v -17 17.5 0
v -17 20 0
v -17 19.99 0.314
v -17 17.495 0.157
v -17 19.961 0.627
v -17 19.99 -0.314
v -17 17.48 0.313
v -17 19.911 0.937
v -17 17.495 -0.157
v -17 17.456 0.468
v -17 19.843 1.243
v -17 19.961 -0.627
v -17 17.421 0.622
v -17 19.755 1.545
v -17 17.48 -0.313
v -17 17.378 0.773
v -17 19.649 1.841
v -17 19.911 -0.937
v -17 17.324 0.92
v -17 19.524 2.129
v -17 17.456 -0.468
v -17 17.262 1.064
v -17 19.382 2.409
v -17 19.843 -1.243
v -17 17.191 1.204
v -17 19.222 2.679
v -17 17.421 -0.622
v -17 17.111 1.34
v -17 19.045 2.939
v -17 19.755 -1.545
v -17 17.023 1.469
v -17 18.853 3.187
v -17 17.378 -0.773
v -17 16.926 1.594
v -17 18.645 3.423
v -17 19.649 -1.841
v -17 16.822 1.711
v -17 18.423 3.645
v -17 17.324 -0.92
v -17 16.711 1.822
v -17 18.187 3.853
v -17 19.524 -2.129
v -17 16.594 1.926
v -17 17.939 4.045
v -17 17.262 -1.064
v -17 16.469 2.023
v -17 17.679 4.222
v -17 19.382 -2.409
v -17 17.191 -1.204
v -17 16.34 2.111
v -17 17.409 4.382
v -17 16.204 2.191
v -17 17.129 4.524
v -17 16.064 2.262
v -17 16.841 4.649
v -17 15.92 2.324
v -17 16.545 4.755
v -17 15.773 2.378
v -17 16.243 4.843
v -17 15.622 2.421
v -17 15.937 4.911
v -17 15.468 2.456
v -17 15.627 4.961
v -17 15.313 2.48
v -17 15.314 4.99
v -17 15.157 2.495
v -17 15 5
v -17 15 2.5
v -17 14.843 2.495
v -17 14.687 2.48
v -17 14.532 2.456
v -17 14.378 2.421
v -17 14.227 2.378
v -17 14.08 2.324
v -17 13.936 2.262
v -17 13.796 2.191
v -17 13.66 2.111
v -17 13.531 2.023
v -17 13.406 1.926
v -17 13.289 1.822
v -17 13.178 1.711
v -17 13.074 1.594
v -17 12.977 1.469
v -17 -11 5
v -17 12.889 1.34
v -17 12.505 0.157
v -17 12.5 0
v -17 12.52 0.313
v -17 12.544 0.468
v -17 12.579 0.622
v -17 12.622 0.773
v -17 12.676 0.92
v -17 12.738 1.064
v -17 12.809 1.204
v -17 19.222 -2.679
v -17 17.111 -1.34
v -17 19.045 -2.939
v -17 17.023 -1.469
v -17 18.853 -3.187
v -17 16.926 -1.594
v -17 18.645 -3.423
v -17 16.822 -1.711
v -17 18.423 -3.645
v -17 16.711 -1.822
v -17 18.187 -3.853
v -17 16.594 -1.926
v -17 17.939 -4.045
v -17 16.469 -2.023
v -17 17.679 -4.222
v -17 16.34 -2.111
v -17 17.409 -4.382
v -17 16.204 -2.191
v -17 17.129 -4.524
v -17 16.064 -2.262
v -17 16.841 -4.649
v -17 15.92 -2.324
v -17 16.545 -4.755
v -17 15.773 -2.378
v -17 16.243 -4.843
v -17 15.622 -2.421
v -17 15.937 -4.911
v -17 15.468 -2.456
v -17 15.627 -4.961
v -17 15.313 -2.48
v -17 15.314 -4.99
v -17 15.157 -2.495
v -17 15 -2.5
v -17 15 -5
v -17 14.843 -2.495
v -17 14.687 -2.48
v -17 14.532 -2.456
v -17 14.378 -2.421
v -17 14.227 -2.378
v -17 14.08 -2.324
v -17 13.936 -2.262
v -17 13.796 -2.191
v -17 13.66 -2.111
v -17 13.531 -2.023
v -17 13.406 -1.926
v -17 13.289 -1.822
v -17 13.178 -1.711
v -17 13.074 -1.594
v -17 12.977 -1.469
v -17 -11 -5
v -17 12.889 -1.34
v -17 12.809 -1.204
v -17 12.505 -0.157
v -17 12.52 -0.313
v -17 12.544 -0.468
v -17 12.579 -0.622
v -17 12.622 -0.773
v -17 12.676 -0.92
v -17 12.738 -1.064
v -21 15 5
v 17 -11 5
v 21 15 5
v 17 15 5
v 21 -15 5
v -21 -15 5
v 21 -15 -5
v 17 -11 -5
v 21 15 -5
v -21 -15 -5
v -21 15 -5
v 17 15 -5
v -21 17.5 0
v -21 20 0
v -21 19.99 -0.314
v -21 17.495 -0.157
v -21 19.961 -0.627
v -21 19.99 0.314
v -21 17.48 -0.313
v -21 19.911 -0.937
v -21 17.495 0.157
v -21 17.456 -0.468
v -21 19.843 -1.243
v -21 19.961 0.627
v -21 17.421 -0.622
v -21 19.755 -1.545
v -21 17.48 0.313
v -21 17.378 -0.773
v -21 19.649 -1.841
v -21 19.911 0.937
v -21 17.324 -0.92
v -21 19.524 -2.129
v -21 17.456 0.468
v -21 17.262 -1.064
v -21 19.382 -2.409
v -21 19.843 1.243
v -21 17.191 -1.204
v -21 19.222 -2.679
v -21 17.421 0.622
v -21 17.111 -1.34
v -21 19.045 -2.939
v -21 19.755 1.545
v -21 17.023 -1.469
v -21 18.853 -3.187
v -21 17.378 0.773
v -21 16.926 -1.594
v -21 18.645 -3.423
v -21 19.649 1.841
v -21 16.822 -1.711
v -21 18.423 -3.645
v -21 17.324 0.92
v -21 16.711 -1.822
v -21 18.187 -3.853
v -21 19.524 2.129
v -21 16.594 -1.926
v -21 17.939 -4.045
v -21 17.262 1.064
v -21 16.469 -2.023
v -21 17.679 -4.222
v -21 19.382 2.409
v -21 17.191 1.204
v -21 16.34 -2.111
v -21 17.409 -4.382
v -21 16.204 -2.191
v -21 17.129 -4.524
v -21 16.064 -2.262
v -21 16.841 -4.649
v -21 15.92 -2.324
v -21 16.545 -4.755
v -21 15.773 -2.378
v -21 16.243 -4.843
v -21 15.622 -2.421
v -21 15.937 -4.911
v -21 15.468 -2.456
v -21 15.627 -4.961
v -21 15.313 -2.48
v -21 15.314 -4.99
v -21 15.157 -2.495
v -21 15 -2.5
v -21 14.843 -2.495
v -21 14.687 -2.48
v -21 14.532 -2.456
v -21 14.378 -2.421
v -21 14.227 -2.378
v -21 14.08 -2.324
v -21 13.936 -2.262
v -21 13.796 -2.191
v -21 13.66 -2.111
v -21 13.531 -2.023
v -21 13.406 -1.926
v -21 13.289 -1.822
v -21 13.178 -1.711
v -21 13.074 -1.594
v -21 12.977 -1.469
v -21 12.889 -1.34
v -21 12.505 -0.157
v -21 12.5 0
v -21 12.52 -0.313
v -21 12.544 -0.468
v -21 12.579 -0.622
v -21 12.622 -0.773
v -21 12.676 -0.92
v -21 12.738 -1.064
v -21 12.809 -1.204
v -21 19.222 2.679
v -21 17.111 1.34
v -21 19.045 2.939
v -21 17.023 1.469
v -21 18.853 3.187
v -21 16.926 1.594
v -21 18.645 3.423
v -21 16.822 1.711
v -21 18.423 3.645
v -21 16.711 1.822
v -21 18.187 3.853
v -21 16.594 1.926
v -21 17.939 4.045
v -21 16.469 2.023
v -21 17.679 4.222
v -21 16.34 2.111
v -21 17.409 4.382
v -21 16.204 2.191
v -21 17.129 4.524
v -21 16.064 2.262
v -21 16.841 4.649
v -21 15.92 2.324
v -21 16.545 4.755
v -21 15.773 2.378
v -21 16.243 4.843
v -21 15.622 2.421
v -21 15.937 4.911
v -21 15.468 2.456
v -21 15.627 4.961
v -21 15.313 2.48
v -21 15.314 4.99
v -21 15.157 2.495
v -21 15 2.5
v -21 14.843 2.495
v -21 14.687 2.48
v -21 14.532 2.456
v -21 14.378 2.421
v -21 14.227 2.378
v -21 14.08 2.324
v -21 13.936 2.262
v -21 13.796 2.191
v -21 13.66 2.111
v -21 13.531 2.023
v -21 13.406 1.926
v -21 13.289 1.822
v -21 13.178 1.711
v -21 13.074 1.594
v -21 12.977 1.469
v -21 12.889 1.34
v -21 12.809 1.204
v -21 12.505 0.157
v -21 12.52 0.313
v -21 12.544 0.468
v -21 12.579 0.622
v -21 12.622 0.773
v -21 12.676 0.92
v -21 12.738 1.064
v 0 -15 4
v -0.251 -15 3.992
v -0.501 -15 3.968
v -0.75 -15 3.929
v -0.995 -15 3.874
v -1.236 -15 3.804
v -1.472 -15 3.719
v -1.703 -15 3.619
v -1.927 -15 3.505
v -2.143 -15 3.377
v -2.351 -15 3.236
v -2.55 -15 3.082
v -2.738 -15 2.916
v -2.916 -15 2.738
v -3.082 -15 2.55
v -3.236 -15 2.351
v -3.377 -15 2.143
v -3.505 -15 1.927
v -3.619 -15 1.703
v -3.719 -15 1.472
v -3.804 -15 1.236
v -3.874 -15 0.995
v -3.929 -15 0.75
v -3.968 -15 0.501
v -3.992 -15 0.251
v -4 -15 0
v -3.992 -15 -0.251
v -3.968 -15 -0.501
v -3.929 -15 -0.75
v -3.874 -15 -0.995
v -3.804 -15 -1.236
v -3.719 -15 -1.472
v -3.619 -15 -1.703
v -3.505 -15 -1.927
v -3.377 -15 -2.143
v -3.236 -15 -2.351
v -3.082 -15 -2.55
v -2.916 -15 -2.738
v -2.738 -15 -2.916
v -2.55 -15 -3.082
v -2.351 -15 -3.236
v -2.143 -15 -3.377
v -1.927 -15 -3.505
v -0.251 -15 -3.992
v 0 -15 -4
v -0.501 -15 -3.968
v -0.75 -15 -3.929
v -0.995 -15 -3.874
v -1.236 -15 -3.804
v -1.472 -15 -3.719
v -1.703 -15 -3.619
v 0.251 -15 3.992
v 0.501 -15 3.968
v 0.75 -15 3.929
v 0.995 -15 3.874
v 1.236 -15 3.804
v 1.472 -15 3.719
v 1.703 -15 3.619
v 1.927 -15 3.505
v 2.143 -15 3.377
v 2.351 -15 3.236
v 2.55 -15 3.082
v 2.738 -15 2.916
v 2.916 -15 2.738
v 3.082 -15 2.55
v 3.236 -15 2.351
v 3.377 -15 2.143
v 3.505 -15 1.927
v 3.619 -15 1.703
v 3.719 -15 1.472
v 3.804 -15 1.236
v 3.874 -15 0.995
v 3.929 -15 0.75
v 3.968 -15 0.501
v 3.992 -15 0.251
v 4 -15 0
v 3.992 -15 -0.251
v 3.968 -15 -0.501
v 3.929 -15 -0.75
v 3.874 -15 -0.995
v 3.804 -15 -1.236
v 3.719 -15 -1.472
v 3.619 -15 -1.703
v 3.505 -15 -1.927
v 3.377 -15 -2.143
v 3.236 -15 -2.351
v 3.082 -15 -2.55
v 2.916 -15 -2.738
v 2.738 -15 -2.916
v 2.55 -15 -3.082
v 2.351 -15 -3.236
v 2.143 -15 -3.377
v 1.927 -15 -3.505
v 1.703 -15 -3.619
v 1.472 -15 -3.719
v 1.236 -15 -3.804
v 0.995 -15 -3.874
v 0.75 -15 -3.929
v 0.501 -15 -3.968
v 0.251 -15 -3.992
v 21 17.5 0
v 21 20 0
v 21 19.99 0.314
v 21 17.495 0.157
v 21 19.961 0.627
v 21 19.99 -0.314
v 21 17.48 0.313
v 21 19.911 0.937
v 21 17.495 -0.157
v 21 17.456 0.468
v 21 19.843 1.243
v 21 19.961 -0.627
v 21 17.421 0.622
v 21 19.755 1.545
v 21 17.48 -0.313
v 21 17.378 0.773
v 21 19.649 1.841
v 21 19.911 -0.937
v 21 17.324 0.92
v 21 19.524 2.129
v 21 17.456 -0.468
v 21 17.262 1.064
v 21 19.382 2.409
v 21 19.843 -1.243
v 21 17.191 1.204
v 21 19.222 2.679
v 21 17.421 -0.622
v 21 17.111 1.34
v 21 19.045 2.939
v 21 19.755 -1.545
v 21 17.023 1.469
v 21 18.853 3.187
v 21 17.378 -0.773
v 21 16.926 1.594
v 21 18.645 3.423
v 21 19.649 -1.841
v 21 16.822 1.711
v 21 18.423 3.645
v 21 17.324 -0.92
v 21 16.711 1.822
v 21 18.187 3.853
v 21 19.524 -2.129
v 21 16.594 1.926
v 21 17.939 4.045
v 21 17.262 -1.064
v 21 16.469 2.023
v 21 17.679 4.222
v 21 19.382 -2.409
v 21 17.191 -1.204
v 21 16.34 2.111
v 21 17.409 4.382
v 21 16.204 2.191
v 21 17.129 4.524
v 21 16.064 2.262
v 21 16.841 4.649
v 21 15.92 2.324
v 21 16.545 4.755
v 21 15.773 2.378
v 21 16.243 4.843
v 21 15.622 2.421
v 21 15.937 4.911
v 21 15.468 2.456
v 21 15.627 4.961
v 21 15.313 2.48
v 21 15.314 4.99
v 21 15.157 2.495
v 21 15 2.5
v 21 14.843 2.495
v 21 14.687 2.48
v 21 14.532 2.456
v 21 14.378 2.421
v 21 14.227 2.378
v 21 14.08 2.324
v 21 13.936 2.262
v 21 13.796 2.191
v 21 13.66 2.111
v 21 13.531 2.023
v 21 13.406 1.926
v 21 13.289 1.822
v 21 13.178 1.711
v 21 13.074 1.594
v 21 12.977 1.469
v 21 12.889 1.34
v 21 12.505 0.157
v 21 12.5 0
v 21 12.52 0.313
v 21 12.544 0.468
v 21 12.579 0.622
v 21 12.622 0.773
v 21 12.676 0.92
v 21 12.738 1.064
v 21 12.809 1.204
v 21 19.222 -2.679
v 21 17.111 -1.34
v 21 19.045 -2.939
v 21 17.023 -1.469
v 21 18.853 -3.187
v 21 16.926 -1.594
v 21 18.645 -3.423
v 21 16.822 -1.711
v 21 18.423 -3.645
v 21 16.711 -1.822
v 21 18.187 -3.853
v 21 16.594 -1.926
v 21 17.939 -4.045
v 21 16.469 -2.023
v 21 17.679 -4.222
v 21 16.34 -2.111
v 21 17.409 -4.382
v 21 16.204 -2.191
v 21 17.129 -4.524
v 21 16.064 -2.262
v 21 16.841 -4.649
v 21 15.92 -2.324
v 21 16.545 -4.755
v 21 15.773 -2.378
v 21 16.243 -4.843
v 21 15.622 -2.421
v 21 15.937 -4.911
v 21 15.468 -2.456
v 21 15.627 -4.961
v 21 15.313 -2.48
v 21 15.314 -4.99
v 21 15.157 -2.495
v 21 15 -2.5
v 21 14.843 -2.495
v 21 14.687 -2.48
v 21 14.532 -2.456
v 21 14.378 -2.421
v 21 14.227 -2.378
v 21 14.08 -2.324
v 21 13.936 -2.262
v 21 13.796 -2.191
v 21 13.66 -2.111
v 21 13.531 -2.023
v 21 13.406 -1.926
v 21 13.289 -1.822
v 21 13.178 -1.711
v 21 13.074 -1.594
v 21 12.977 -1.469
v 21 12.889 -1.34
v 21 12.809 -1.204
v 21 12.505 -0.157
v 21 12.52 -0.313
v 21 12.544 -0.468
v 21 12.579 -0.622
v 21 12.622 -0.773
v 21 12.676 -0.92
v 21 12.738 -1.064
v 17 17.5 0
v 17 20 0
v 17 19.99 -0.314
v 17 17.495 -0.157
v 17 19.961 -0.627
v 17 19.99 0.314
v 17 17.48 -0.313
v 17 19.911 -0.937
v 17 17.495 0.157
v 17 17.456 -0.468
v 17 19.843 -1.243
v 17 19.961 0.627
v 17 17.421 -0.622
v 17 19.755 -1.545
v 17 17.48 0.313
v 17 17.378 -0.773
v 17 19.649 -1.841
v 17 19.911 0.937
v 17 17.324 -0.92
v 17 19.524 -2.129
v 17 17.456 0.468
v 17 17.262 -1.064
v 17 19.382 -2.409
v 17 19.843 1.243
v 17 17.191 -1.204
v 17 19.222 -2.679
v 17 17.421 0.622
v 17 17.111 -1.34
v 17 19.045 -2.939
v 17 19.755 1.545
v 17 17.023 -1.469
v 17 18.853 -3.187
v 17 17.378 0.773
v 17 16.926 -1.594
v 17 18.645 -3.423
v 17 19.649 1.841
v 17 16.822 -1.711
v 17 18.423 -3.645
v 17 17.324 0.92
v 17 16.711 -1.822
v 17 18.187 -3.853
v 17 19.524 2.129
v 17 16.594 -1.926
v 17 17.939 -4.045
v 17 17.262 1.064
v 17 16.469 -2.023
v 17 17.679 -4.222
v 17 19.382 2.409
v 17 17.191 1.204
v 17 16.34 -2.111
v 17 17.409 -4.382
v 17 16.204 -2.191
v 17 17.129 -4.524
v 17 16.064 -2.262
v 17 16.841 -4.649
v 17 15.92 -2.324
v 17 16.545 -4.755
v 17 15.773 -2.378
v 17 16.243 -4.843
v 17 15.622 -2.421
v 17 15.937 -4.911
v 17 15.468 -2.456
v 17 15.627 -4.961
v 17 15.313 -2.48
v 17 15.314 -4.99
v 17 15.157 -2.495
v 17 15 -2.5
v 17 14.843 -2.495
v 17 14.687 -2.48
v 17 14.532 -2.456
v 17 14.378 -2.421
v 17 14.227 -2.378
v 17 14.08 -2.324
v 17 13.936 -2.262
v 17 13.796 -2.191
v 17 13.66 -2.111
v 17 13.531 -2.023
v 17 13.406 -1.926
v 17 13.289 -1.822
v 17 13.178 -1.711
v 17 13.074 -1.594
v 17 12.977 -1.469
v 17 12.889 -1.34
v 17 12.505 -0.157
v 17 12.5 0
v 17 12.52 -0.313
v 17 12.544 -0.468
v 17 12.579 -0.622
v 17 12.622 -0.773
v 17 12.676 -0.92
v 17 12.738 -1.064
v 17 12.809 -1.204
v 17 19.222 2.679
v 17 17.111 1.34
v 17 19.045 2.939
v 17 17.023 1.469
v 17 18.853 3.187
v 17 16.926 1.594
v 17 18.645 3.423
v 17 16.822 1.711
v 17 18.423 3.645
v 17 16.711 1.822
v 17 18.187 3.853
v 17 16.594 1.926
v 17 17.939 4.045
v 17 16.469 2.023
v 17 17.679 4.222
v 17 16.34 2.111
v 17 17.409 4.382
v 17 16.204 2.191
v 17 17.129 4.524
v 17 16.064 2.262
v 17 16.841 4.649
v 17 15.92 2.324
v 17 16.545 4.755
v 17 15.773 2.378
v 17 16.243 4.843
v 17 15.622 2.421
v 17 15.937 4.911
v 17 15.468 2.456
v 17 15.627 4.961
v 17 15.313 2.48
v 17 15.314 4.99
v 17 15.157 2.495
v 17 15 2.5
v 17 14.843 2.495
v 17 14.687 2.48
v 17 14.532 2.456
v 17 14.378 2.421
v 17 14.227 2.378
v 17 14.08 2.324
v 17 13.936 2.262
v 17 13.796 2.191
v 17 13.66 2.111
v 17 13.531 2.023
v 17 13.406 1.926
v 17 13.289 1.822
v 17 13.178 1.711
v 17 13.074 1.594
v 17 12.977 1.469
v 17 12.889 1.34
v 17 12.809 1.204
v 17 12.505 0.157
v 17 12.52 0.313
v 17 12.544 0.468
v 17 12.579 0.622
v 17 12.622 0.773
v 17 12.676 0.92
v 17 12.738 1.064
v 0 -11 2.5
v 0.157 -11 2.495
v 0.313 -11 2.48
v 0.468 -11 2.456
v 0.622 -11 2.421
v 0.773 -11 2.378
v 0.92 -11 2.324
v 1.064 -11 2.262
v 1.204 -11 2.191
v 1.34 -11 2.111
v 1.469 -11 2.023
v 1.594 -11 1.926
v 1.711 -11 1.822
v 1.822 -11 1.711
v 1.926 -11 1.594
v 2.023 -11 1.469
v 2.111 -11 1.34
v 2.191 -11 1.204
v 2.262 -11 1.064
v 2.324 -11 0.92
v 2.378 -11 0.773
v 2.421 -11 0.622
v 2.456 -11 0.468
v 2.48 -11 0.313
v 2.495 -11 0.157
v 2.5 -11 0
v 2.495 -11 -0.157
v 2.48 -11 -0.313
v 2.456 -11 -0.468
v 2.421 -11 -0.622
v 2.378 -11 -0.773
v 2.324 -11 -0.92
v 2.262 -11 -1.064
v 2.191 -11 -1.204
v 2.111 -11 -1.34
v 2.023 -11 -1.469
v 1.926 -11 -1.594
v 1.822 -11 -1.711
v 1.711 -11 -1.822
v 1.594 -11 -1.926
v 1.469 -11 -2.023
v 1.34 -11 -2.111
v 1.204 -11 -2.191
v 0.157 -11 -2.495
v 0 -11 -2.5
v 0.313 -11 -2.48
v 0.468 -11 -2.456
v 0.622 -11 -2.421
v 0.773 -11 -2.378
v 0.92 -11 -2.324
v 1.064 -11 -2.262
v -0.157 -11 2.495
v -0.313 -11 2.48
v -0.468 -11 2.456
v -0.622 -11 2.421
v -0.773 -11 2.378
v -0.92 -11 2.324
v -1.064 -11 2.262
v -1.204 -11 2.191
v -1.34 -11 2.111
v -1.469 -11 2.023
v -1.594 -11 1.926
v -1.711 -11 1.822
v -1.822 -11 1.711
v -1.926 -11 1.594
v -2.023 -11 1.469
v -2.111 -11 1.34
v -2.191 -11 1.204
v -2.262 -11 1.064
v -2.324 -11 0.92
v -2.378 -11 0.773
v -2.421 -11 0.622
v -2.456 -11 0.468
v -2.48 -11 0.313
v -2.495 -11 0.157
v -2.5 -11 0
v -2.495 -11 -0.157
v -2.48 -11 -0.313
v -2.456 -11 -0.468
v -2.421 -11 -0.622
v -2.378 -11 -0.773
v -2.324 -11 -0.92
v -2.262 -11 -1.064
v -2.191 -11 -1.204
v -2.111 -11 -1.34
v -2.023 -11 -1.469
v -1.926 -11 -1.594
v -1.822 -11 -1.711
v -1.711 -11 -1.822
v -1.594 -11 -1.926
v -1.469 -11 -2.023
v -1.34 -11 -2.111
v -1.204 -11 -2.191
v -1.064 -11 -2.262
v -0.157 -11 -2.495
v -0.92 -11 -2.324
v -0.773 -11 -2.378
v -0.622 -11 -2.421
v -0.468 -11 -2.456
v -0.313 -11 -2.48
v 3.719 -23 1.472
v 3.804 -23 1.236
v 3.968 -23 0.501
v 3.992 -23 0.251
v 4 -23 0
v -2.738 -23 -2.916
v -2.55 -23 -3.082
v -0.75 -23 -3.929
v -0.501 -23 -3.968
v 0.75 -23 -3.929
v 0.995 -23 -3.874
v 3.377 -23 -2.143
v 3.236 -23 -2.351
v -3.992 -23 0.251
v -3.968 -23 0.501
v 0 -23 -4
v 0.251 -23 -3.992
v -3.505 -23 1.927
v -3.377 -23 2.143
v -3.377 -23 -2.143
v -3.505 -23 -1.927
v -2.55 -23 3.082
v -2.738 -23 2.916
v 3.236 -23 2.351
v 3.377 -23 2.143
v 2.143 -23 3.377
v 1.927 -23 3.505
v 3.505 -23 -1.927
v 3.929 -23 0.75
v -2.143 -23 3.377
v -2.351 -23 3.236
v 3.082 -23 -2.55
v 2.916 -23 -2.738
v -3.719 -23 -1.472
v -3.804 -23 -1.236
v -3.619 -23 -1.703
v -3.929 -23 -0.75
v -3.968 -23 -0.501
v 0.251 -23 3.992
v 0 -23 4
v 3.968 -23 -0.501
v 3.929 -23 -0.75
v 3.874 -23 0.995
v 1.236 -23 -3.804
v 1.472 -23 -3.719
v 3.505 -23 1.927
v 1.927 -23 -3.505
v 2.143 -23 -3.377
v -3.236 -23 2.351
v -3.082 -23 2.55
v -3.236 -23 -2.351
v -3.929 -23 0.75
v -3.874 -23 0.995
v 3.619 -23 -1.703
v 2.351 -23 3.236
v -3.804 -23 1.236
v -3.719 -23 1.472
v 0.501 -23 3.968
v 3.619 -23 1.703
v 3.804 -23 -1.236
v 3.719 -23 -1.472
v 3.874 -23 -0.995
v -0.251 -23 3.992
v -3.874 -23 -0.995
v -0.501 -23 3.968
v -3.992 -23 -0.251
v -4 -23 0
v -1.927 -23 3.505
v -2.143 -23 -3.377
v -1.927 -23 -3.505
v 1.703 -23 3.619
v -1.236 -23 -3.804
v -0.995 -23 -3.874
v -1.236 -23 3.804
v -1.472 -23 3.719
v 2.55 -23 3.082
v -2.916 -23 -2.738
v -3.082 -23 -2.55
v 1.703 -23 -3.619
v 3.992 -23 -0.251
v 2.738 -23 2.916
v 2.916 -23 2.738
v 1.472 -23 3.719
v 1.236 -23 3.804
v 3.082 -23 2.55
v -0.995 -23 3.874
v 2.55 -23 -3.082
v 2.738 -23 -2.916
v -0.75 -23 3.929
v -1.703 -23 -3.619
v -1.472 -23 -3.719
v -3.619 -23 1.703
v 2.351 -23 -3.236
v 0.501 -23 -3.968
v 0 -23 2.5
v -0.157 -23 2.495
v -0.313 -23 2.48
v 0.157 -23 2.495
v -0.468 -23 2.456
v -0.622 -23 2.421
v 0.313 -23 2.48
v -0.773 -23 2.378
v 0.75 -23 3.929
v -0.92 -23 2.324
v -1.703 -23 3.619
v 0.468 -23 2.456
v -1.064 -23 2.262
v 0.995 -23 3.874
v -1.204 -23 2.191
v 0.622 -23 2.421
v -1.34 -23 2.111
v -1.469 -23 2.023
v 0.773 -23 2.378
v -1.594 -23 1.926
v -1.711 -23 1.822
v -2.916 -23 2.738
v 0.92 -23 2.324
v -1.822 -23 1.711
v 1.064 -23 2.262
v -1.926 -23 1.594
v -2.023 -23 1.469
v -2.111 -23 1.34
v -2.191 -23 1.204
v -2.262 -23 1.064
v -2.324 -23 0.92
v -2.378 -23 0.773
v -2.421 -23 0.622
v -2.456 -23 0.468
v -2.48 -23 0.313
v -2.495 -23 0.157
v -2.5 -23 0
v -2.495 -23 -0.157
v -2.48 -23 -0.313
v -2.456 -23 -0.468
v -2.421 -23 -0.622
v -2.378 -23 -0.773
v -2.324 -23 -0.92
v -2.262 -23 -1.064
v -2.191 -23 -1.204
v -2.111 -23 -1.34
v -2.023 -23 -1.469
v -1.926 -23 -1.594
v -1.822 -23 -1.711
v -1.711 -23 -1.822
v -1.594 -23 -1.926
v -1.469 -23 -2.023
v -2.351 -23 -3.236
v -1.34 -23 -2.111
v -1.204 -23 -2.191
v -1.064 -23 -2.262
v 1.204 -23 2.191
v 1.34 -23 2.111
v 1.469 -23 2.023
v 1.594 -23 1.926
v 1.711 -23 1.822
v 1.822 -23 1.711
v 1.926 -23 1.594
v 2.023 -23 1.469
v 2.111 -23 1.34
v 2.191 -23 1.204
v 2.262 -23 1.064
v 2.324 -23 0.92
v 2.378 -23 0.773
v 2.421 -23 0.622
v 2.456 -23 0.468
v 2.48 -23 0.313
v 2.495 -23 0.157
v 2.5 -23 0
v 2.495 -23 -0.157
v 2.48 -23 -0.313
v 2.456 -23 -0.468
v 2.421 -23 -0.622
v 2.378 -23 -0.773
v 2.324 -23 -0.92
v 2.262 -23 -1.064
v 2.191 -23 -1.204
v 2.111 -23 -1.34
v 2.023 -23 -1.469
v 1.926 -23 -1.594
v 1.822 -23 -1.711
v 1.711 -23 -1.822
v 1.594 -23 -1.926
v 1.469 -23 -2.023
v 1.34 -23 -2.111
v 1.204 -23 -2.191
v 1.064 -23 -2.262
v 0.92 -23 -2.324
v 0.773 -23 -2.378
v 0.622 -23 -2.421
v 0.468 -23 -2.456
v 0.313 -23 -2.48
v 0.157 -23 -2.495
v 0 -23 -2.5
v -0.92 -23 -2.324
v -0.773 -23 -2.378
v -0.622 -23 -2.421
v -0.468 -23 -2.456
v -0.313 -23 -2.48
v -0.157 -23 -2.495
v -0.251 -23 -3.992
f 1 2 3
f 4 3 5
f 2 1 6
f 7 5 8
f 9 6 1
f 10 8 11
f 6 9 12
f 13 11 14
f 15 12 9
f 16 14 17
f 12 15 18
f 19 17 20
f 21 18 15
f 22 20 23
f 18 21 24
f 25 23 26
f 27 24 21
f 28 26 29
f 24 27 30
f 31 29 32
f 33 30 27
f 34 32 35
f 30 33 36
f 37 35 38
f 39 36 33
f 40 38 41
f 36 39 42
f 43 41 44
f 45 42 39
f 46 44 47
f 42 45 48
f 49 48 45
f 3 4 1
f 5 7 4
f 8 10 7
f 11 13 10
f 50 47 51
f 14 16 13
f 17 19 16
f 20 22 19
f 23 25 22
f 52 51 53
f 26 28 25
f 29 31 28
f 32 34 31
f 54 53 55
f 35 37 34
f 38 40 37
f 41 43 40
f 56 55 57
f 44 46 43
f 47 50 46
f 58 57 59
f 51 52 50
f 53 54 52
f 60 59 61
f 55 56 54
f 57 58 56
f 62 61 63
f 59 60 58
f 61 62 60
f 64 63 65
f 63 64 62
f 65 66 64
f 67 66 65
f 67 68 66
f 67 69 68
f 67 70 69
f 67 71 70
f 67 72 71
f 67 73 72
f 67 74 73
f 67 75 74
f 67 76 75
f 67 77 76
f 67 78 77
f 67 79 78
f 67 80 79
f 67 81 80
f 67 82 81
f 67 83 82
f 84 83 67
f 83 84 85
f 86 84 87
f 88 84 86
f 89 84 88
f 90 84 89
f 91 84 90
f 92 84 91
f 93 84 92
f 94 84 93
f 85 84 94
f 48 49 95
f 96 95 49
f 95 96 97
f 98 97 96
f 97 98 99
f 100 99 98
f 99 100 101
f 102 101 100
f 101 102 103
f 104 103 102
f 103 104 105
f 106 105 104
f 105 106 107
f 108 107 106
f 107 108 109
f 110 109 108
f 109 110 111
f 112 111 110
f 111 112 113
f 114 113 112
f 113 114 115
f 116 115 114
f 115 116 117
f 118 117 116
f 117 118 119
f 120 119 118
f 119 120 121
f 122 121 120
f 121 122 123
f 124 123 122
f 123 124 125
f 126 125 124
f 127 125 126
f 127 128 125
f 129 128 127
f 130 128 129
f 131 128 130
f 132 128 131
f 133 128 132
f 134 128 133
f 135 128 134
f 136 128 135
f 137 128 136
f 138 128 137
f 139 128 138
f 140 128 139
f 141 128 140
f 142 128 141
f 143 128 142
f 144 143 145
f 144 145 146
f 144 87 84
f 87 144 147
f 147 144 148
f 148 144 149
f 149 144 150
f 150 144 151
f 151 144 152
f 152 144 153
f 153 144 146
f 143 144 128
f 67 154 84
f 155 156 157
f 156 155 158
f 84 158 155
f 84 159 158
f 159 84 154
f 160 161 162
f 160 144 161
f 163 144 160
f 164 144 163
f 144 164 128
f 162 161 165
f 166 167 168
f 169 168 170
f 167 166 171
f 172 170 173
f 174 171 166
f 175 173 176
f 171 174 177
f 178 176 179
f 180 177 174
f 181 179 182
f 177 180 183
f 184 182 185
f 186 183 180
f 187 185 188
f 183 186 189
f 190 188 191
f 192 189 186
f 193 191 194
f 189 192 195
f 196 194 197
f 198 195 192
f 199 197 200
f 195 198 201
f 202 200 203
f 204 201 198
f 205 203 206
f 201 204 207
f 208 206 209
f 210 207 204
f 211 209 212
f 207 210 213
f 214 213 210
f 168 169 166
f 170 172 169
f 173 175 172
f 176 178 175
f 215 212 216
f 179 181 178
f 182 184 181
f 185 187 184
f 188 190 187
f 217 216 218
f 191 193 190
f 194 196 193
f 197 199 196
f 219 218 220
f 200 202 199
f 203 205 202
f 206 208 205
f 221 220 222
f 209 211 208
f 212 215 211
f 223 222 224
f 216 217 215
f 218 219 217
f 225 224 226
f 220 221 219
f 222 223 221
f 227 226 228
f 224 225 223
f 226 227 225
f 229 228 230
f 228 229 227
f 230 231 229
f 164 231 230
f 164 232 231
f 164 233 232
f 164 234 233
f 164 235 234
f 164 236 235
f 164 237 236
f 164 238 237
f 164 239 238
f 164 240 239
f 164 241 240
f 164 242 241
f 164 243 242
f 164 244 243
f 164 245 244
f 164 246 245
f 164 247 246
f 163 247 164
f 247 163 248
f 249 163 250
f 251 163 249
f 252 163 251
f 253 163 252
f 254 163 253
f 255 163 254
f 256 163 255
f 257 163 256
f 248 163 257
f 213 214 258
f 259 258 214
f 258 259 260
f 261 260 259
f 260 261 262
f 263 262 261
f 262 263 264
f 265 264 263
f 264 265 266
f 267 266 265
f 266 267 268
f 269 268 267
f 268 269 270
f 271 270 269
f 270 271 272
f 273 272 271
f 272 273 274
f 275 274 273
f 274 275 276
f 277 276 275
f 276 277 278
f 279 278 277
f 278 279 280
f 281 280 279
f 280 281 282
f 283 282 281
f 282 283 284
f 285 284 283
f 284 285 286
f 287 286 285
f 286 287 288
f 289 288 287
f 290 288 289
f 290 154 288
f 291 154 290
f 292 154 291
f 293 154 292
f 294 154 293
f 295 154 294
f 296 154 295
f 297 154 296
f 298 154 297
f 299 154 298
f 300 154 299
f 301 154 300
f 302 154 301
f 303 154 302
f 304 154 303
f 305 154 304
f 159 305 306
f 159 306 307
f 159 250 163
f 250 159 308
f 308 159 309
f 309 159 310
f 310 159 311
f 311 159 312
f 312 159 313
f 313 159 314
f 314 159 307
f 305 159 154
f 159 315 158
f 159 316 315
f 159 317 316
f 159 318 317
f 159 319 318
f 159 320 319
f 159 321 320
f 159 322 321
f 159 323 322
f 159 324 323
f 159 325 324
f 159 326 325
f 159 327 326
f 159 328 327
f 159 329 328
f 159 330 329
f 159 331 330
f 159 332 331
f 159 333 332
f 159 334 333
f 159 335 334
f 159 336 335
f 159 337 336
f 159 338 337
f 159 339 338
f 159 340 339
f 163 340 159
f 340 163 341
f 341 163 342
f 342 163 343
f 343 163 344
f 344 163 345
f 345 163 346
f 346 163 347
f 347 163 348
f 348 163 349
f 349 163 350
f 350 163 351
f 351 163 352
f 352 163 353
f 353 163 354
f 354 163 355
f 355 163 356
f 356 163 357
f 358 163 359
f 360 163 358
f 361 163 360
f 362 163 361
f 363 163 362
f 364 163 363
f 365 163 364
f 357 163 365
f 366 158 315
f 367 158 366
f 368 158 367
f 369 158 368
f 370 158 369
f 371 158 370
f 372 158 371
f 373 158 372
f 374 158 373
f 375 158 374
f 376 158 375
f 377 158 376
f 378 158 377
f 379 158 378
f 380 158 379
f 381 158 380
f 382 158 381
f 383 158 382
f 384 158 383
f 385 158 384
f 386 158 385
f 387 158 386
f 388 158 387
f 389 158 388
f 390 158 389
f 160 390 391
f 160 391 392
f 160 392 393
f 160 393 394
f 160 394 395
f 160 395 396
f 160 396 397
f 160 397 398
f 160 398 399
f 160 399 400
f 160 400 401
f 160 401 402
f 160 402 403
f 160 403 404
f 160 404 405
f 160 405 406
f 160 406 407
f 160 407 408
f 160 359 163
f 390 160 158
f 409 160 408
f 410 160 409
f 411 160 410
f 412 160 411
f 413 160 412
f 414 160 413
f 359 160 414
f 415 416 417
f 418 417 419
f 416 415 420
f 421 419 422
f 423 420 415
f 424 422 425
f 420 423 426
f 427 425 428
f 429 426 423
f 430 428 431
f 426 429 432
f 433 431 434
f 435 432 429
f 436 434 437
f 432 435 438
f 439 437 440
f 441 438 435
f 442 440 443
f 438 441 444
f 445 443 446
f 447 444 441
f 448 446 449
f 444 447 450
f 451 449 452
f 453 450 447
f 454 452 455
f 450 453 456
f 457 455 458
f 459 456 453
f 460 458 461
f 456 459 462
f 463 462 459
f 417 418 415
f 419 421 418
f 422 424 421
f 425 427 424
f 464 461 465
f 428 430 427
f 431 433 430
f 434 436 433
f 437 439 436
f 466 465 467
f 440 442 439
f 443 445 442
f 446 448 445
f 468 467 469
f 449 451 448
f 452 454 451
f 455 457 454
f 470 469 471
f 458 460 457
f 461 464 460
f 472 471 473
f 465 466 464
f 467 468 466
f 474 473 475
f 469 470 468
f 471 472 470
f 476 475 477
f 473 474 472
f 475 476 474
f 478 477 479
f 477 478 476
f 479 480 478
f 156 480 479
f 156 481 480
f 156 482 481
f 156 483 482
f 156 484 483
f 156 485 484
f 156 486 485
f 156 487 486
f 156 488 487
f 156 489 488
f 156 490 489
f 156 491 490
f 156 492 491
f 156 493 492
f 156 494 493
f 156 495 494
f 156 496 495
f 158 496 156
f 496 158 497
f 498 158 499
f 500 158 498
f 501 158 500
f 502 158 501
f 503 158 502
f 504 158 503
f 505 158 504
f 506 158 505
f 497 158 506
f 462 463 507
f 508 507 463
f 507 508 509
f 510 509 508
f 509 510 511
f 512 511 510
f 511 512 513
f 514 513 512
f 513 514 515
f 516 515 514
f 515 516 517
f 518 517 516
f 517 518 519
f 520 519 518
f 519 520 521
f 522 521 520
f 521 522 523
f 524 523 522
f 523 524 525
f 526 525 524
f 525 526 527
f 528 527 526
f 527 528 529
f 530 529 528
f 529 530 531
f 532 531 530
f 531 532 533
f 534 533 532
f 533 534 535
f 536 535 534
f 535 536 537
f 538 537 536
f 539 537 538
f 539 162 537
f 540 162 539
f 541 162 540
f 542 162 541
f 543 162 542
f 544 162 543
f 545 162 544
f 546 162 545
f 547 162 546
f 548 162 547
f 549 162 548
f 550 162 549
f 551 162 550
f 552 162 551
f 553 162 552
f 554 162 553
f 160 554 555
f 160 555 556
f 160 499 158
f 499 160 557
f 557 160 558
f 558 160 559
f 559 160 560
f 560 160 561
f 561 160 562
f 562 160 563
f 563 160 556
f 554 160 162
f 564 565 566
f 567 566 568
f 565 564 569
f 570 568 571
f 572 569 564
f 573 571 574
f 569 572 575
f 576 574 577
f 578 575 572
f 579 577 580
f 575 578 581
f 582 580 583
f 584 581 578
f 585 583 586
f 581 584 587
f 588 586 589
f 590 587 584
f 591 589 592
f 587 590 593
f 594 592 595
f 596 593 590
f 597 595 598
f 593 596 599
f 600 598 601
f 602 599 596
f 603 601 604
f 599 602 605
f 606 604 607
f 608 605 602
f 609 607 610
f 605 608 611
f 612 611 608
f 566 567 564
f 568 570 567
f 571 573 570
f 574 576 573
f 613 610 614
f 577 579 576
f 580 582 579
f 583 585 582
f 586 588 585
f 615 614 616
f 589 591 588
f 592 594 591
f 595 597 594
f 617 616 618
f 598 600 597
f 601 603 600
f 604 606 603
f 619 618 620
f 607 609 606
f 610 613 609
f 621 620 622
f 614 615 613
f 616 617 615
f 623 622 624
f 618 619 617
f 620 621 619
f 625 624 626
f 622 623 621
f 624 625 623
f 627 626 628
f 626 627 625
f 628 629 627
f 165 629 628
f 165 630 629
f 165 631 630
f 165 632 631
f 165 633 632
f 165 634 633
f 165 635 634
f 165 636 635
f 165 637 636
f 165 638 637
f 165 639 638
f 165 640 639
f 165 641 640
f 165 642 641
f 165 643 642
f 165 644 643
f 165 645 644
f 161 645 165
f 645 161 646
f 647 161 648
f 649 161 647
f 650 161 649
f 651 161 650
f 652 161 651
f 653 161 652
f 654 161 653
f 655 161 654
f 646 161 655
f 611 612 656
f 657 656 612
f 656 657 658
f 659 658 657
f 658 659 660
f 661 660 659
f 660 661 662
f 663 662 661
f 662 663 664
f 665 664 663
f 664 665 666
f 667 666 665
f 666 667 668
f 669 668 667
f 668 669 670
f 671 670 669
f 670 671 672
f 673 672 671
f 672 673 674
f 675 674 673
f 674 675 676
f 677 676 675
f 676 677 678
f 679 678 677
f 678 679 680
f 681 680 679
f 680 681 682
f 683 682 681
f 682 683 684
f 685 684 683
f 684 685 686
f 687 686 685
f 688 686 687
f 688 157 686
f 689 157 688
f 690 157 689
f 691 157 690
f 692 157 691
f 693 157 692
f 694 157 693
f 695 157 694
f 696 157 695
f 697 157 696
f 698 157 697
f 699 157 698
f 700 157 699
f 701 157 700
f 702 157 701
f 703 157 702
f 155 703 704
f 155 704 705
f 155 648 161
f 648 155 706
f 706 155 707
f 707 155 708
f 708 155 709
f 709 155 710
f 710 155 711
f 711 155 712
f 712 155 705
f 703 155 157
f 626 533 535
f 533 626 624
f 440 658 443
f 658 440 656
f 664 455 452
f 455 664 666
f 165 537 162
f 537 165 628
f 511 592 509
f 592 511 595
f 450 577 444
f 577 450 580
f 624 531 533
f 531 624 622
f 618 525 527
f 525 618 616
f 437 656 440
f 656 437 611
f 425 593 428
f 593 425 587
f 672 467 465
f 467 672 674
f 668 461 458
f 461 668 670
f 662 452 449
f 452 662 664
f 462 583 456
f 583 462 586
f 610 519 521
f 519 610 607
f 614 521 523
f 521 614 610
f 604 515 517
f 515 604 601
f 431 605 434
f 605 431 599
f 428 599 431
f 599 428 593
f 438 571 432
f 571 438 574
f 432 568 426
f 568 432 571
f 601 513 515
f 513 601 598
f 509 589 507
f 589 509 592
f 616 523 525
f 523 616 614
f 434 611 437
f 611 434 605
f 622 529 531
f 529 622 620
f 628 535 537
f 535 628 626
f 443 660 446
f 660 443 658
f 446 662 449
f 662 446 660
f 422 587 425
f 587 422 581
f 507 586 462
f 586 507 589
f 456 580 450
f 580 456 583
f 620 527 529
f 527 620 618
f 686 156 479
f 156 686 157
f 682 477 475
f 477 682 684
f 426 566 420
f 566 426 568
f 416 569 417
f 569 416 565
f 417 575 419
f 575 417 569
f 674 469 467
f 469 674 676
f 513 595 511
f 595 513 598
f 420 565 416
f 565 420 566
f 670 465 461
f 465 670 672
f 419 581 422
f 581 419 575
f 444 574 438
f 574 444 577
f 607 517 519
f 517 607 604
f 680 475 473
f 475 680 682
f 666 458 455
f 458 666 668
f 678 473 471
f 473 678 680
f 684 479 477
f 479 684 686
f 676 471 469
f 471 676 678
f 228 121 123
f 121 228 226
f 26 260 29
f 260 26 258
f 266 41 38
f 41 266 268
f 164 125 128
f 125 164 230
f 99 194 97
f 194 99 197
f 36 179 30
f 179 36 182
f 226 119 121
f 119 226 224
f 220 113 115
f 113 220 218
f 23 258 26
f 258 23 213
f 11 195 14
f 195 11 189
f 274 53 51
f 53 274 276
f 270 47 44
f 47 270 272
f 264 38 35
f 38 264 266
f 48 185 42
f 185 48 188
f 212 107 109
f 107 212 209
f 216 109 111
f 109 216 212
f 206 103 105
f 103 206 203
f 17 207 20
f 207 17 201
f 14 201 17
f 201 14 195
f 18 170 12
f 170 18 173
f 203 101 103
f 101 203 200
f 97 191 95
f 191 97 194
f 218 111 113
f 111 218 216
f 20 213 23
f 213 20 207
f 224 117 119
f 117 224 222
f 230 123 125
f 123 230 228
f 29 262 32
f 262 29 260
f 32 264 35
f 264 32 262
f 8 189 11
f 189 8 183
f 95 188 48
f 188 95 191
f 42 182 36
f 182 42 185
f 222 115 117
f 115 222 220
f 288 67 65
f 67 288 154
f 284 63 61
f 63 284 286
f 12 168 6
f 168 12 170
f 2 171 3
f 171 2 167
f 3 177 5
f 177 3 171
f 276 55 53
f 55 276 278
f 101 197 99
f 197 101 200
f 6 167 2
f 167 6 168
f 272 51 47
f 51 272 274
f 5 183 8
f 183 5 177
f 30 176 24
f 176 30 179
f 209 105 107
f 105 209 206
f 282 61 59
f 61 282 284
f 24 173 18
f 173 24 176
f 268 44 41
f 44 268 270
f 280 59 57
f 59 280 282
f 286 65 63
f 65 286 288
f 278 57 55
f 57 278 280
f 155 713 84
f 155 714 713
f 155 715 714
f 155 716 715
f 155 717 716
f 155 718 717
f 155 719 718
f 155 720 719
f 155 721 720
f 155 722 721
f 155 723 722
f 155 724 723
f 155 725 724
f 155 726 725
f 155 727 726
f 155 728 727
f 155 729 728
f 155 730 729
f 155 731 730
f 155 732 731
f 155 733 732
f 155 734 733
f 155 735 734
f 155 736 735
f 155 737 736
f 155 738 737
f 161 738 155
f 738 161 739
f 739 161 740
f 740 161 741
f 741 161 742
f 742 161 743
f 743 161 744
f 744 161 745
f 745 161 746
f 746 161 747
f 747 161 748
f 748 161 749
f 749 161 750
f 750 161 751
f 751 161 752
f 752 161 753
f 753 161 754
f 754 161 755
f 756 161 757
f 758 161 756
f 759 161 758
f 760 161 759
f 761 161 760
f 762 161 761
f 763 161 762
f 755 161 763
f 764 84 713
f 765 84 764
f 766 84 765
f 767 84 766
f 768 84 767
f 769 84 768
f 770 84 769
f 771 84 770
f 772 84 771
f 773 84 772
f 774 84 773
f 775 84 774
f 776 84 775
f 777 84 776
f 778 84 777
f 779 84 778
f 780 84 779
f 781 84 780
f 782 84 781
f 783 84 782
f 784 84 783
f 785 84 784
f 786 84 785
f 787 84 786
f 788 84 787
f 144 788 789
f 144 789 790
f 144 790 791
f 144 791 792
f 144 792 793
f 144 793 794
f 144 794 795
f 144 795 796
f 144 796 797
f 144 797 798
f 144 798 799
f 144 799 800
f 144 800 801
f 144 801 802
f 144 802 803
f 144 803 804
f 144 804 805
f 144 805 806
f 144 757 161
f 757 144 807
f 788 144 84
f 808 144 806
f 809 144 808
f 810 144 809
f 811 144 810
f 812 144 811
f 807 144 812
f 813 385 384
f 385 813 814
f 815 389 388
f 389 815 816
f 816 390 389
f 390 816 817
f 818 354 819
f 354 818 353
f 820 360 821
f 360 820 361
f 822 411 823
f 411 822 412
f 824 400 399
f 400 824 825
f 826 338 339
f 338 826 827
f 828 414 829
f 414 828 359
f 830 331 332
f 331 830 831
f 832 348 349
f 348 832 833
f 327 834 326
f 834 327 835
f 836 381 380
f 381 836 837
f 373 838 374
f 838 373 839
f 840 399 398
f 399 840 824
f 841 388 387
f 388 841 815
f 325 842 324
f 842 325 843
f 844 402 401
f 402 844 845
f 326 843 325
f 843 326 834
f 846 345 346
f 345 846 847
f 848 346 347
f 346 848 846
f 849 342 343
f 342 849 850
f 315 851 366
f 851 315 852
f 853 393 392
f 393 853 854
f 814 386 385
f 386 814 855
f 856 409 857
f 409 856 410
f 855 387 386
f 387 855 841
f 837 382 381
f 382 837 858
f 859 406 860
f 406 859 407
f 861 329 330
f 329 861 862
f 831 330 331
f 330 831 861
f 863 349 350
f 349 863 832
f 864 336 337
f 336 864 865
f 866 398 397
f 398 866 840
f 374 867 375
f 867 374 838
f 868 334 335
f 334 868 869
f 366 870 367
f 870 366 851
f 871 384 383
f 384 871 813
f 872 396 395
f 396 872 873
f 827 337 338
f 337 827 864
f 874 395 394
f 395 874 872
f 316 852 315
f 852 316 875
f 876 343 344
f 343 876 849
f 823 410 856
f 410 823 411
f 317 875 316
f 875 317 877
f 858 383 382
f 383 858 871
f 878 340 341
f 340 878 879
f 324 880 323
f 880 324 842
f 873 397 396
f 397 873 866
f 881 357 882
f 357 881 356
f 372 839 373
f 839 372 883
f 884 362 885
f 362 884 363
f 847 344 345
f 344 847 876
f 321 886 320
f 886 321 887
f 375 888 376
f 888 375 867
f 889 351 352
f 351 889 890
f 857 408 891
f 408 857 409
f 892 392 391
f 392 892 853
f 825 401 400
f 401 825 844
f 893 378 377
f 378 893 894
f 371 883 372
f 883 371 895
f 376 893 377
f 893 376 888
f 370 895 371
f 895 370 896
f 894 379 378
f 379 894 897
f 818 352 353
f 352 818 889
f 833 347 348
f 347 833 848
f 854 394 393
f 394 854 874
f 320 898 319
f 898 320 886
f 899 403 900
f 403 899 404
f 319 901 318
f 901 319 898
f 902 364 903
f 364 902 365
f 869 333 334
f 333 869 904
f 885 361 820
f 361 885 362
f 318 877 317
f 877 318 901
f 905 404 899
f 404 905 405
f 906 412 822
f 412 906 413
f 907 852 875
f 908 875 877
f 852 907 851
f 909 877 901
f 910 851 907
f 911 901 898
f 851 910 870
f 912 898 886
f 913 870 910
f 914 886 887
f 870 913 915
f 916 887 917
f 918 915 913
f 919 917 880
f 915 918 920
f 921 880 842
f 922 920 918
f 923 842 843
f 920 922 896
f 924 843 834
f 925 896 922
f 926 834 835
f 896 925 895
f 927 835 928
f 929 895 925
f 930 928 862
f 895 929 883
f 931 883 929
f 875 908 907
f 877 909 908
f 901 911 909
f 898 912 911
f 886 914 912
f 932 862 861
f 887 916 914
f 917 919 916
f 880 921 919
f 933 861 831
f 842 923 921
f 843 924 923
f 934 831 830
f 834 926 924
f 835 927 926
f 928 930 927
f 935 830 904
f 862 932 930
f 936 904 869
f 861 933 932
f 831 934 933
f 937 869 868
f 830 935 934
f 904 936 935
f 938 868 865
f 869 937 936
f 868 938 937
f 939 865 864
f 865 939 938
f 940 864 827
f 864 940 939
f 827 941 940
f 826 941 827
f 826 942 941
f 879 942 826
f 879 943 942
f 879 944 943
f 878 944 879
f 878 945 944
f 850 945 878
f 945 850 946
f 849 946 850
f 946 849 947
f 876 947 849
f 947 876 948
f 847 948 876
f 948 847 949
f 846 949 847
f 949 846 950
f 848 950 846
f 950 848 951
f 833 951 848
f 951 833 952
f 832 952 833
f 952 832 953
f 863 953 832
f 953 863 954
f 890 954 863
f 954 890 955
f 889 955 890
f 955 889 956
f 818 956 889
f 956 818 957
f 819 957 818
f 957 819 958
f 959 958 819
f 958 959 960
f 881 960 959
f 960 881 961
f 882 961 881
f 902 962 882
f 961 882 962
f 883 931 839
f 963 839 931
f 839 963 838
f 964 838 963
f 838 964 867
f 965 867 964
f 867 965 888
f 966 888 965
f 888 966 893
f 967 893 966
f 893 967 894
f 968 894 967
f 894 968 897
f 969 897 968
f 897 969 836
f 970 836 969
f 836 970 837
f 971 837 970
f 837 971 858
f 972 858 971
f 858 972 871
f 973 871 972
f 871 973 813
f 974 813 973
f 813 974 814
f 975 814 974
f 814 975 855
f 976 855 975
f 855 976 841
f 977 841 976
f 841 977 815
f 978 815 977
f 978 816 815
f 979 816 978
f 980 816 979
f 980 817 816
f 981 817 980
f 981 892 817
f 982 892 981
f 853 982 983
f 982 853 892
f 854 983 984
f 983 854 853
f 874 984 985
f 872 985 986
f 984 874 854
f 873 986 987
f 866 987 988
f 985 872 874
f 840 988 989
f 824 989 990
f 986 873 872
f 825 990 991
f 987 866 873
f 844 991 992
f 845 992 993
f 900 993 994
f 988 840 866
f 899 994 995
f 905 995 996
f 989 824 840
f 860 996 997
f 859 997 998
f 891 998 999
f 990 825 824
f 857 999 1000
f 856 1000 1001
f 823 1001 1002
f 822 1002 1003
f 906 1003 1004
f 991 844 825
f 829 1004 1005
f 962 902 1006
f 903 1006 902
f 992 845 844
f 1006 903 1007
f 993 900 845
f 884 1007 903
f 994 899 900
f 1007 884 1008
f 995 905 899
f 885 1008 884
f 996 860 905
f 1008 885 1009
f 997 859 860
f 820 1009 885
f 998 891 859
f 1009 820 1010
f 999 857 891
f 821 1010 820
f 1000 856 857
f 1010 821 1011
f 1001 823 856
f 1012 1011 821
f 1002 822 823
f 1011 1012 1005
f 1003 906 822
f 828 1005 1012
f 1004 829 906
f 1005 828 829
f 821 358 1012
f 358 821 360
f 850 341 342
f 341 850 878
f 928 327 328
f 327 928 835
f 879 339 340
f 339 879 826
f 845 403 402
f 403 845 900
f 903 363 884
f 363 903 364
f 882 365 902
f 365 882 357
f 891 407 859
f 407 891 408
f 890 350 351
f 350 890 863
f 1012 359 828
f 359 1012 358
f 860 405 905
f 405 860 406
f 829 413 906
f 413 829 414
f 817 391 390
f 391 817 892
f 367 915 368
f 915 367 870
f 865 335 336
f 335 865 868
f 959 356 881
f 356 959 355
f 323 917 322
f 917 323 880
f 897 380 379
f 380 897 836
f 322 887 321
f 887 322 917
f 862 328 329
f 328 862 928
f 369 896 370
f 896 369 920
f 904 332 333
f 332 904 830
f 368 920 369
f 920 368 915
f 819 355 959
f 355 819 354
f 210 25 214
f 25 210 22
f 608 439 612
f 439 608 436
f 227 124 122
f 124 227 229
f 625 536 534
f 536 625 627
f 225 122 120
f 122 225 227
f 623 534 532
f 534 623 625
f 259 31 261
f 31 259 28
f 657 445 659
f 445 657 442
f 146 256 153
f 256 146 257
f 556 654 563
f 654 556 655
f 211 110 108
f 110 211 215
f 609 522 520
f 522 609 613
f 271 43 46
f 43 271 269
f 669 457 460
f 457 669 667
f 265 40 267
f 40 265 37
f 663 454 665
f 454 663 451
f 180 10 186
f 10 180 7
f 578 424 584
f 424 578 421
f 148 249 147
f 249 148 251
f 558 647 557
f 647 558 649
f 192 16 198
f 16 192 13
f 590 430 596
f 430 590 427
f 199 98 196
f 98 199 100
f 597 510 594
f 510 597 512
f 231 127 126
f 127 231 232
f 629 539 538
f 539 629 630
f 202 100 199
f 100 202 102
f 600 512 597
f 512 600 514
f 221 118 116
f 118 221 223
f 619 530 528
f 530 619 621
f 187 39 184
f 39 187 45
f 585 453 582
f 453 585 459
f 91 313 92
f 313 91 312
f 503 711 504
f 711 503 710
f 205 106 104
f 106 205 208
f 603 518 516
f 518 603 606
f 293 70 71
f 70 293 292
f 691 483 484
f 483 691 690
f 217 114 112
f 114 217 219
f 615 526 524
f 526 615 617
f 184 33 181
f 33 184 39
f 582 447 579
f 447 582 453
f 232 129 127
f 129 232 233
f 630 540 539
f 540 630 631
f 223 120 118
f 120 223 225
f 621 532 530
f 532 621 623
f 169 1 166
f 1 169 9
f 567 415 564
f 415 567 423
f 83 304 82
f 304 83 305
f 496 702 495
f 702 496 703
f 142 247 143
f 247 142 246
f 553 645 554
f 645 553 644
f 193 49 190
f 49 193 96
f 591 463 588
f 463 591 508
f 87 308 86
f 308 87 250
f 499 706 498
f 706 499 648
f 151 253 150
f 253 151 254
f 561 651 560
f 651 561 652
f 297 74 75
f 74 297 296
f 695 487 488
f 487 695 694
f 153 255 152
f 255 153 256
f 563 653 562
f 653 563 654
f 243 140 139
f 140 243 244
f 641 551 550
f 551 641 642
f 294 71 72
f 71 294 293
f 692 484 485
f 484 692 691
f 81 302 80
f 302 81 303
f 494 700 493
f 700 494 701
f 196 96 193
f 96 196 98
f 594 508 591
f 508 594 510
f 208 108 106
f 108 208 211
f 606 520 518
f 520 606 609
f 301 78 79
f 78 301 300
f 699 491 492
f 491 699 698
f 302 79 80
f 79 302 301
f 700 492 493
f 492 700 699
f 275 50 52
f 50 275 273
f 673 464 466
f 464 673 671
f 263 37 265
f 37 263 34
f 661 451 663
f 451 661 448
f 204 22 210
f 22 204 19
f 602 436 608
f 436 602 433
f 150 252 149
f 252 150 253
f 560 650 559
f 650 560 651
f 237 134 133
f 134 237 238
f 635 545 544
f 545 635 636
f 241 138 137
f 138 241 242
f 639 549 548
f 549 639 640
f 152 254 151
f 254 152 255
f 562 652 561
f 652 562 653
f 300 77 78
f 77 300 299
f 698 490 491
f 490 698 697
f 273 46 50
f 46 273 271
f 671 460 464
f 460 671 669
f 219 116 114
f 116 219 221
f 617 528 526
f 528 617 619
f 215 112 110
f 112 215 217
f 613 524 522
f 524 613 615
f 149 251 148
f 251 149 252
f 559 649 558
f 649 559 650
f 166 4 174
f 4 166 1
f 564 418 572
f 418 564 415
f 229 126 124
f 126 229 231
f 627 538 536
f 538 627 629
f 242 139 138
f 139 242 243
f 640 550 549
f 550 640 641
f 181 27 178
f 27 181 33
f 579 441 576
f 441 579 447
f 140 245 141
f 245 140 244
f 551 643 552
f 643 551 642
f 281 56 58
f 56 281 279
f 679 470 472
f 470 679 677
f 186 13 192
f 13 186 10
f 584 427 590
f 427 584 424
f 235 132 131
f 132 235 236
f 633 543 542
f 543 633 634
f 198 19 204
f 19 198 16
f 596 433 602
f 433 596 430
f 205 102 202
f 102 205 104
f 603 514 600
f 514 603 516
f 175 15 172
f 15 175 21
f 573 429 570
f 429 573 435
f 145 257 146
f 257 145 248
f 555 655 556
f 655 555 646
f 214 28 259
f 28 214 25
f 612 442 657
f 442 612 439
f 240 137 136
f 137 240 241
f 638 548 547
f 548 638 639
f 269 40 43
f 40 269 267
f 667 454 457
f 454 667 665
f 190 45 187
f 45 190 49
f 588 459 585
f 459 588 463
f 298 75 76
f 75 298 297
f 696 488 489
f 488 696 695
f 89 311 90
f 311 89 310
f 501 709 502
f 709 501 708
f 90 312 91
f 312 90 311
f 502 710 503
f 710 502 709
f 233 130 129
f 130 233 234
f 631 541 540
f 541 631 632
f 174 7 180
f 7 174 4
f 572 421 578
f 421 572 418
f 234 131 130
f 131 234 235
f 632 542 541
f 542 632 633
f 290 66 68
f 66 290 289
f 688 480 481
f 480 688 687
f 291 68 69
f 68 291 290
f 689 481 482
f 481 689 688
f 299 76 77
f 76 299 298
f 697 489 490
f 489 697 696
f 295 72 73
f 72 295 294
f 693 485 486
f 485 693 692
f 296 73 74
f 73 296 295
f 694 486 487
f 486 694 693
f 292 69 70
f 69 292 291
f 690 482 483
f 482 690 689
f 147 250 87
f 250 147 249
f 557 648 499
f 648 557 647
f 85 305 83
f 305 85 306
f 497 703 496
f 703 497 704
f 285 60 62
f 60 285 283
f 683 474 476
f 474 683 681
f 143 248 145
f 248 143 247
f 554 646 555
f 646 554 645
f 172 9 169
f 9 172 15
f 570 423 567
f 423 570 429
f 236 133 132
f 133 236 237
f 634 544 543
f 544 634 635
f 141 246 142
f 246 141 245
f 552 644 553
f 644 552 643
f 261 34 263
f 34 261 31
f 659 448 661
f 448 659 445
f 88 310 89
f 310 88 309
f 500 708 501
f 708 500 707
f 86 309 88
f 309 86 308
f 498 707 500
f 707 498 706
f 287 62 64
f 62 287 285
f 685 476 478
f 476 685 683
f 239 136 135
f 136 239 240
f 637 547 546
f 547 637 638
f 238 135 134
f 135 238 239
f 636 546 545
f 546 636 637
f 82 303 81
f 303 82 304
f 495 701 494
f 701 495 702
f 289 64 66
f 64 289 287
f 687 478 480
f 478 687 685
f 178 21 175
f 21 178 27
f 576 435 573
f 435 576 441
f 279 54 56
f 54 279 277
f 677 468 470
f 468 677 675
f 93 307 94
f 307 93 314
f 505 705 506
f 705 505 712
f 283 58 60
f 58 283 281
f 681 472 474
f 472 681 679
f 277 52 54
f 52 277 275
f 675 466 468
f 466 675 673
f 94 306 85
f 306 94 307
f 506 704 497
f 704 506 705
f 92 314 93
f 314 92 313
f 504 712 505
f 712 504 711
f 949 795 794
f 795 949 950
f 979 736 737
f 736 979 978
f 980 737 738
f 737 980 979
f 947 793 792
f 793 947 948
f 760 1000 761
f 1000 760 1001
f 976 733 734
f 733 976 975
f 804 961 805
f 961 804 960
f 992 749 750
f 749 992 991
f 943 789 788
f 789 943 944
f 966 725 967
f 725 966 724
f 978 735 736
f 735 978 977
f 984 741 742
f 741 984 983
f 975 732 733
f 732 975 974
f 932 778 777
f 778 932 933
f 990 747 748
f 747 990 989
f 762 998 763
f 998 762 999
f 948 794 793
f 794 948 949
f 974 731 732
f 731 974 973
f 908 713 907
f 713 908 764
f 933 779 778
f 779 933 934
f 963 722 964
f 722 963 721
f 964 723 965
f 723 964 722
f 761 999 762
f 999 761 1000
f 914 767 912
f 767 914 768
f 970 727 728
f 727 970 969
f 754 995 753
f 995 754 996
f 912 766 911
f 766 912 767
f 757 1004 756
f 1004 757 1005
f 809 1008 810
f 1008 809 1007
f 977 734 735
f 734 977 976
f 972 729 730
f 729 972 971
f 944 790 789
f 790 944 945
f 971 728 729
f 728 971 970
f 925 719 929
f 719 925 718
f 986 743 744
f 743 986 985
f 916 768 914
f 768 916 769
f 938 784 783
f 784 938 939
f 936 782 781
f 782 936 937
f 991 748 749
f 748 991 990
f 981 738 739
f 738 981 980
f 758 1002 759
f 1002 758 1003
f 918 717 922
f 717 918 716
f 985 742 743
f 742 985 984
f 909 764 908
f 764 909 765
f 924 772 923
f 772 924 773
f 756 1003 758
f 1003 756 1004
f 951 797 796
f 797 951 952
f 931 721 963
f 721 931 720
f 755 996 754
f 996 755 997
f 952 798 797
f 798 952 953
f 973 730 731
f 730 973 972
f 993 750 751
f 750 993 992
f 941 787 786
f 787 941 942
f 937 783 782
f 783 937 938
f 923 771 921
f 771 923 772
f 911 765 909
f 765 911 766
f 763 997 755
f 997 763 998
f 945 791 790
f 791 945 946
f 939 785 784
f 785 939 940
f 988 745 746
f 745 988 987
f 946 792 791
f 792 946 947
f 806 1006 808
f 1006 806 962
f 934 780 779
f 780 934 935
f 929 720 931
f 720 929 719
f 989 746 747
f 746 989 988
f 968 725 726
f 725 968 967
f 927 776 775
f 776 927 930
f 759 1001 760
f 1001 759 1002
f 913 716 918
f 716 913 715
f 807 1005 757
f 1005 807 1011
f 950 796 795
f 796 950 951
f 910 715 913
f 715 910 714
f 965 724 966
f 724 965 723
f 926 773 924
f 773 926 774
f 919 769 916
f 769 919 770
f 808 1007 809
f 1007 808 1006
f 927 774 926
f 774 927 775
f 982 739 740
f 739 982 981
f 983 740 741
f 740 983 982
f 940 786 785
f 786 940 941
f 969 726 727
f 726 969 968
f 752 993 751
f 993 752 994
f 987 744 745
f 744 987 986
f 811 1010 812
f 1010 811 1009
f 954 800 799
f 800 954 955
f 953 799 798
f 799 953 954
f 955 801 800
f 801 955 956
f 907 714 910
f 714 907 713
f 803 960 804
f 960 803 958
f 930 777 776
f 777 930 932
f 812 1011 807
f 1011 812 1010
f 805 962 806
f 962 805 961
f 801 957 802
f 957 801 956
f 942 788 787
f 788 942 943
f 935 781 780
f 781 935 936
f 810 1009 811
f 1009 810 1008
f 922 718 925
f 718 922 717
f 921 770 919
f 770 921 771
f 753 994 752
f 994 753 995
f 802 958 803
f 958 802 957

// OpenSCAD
$fn=100;
difference(){
    union(){
        translate([-19,0,0]) cube([4,30,10],center=true);
        translate([19,0,0]) cube([4,30,10],center=true);
        translate([19,15,0]) rotate([0,90,0]) cylinder(r=5,h=4,center=true);
        translate([-19,15,0]) rotate([0,90,0]) cylinder(r=5,h=4,center=true);
        translate([0,-13,0]) cube([36,4,10],center=true);
        translate([0,-15,0]) rotate([90,0,0]) cylinder(r=4,h=8);
    }
    union(){
        translate([0,15,0]) rotate([0,90,0]) cylinder(r=2.5,h=50,center=true);
        translate([0,0,0]) rotate([90,0,0]) cylinder(r=2.5,h=50,center=true);
    }
}
